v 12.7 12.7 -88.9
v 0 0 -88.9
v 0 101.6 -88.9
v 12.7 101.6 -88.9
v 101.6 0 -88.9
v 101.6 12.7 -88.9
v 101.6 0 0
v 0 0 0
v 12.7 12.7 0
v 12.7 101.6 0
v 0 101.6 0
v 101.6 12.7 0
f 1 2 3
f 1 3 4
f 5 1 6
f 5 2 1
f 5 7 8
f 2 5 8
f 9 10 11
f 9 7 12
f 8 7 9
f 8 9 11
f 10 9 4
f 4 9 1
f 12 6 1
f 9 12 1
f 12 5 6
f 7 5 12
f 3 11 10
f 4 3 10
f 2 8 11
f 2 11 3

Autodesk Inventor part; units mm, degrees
ref_plane "YZ Plane" through (0, 0, 0) normal (1, 0, 0) x (0, 1, 0)
ref_plane "XZ Plane" through (0, 0, 0) normal (0, 1, 0) x (-1, 0, 0)
ref_plane "XY Plane" through (0, 0, 0) normal (0, 0, 1) x (1, 0, 0)
sketch "Sketch1" plane through (0, 0, 0) normal (0, 1, 0) x (-1, 0, 0)
  line L0 (0, 0) -> (0, -88.9)
  line L1 (0, -88.9) -> (-101.6, -88.9)
  line L2 (-101.6, -88.9) -> (-101.6, 0)
  line L3 (-101.6, 0) -> (0, 0)
  dimension "d0" = 88.9
  dimension "d1" = 101.6
extrude "Extrusion1" add sketch "Sketch1" along normal blind 12.7
sketch "Sketch2" plane through (0, 12.7, 0) normal (0, 1, 0) x (1, 0, 0)
  line L0 (101.6, 88.9) -> (0, 88.9) projected
  line L1 (0, 0) -> (12.7, 0)
  line L2 (12.7, 0) -> (12.7, 88.9)
  line L3 (12.7, 88.9) -> (0, 88.9)
  line L4 (0, 88.9) -> (0, 0)
  dimension "d4" = 12.7
extrude "Extrusion2" add sketch "Sketch2" along normal blind 88.9
properties part number "Post Bracket"
